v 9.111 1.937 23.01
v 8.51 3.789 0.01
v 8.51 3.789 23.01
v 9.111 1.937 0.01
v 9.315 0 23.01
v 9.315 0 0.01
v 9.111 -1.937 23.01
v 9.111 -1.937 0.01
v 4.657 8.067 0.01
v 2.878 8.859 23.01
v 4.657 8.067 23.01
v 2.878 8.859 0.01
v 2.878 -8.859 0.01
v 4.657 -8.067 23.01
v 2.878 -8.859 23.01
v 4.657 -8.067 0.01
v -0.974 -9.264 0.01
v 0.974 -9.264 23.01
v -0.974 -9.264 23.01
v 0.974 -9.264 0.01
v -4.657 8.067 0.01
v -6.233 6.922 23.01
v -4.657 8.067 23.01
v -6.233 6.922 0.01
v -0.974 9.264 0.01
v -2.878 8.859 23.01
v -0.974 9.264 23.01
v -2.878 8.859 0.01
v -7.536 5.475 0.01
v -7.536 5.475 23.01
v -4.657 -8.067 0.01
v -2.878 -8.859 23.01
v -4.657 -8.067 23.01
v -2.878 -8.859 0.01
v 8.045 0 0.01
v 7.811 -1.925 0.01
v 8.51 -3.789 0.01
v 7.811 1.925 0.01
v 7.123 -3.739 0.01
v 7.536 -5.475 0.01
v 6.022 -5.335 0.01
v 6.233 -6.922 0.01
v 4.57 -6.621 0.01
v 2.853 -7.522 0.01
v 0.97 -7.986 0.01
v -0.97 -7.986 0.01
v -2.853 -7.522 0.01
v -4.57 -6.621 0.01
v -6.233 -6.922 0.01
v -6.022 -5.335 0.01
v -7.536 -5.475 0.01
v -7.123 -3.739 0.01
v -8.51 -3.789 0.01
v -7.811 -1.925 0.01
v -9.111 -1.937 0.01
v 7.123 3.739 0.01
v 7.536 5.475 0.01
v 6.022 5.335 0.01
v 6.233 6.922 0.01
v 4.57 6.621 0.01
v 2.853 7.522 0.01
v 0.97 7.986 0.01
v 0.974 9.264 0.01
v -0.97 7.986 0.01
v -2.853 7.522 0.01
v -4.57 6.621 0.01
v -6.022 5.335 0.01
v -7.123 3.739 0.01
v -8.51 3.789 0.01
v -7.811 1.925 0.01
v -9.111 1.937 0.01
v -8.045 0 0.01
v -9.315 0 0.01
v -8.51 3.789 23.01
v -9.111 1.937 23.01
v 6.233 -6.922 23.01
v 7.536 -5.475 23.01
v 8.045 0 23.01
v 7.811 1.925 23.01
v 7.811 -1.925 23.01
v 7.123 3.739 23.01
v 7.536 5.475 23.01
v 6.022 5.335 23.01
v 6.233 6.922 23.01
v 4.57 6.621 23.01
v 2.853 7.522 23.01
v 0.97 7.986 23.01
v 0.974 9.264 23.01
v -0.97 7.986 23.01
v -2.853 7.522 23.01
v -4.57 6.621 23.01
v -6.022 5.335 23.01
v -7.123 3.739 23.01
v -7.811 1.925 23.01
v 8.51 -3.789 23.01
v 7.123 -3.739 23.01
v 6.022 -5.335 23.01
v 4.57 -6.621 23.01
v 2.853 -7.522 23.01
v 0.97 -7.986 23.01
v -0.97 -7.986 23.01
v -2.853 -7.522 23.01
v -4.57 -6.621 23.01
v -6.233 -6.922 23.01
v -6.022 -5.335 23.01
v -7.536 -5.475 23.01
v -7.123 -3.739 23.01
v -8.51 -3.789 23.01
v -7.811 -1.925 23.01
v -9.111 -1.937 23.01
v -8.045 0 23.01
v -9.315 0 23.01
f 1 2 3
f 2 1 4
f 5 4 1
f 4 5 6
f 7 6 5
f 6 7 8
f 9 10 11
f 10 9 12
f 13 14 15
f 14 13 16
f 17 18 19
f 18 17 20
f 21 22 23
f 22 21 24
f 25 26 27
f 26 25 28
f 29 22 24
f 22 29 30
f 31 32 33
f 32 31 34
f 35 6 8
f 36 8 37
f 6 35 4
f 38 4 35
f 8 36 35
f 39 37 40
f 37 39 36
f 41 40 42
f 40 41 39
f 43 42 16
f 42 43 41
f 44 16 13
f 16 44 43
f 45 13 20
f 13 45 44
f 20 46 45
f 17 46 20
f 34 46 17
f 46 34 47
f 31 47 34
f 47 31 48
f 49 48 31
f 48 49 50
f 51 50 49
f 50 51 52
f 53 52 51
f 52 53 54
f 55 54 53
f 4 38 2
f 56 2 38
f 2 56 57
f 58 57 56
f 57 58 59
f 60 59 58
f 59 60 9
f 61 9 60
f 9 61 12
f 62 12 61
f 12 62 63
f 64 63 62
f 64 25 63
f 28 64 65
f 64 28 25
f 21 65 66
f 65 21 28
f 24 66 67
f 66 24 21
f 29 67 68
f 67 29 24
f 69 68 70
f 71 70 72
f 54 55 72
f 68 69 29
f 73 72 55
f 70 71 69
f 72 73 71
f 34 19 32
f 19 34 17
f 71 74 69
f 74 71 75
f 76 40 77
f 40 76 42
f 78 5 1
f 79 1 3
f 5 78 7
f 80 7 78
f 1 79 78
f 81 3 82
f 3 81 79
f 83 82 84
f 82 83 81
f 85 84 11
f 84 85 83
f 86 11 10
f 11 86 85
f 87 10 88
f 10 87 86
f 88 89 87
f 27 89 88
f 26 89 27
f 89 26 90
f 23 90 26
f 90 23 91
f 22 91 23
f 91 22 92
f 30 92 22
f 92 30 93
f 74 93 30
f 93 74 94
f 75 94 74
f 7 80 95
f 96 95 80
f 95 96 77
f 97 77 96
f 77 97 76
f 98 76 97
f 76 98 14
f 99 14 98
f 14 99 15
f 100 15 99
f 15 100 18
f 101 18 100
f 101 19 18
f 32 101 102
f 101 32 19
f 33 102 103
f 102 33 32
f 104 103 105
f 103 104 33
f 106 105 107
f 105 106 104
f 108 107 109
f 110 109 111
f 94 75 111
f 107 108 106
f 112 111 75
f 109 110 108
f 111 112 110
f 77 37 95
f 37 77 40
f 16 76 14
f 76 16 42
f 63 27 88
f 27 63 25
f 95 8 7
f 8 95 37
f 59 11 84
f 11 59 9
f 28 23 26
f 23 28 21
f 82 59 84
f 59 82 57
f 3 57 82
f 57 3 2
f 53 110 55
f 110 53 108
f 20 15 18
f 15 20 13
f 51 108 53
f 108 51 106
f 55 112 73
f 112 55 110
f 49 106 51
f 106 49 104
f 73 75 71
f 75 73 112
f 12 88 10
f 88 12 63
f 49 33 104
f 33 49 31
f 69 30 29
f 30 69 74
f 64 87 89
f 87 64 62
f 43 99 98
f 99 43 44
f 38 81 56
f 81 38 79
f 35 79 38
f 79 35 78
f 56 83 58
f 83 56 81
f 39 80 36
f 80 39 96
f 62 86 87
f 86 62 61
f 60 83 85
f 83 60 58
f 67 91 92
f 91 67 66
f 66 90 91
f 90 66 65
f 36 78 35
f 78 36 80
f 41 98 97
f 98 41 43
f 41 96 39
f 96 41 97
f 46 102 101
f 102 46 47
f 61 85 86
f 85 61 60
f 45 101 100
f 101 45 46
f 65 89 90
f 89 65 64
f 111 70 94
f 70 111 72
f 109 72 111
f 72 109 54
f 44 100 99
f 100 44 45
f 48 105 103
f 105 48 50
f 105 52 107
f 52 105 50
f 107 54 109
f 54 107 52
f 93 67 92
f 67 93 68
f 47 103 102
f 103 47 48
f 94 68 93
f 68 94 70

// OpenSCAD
// -------------------------------------
// Title:        Boton Honda Civic
// Version:      1.0
// Release Date: 2023-05-22
// Author:       Eloy Asensio (eloi.asensio@gmail.com)
// -------------------------------------
//
// Description: Botón del regulador de volumen del Honda Civic
//
// Release Notes:
//
// - Version 1.0:  Versión inicial del Boton Honda Civic
//
 
// -------------------------------------
// Parameters
// -------------------------------------
EPS = 0.01+0;
showButton="Core"; // [External Button, Inner Button, Core]
button_hight = 23; //.1
button_diameter = 40; //.1

inner_button_diameter = 16.09; //.1
inner_button_height = 9; //.1
inner_button_wall=2.54; //.1
inner_button_bottom_height = 2; //.1
inner_button_bottom_diameter = 10; //.1
neck_rad_inner_button = 1; //.1
neck_height_inner_button = 2; //.1

dilatation_margin = 0.6; //.1
inner_dilatation_margin = 1.0; //.1

arc_heigh= 6; //.1
arc_deep= 1; //.1

// -------------------------------------
// Calculated Parameters
// -------------------------------------
l_inner_height = button_hight - neck_height_inner_button + (EPS*2);

// -------------------------------------
// Main
// -------------------------------------
main();

module main(){
    if(showButton=="External Button"){
        externalButton();
    }
    else if(showButton=="Inner Button"){
        innerButton();
    }
    else{
        core();
    }
}

// -------------------------------------
// Modules
// -------------------------------------
module core(){
    customHeight = button_hight+(EPS*2);
    translate([0,0,customHeight/2])
    difference(){
        cylinder(h=button_hight,d=inner_button_diameter+inner_button_wall, center=true);
        cylinder(h=customHeight,d=inner_button_diameter,center=true);
    }
}

module externalButton(){
    l_height = button_hight + (EPS*2);
    angle =  asin(inner_button_wall/inner_button_diameter) ;
    
    union(){
         difference(){
            translate([0,0,button_hight/2])
                cylinder(h=button_hight,d=button_diameter, center= true);
            union(){
                translate([0,0,l_height/2 - EPS ])
                    cylinder(
                        h=l_height,
                        d=inner_button_diameter -  neck_rad_inner_button, 
                        center= true
                    );
                translate([0,0,(l_inner_height/2 - EPS)])
                    cylinder(h=l_inner_height,
                        d=inner_button_diameter + inner_button_wall + dilatation_margin,
                        center= true
                    );   
            }
        }
        
        arc(
            a=angle, 
            r1=(inner_button_diameter/2+inner_button_wall -EPS),
                r2=inner_button_diameter/2 + arc_deep -EPS, 
            h=arc_heigh
        );
        rotate([0,0,360/3])
            arc(
                a=angle, 
                r1=(inner_button_diameter/2+inner_button_wall -EPS), 
                r2=inner_button_diameter/2 + arc_deep -EPS, 
                h=arc_heigh
            );
        rotate([0,0,(360/3)*2])
            arc(
                a=angle, 
                r1=(inner_button_diameter/2+inner_button_wall -EPS), 
                r2=inner_button_diameter/2 + arc_deep -EPS, 
                h=arc_heigh
            );
    }
}

module innerButton(){
    top_cilinder_height = button_hight + (button_hight-l_inner_height);
    union(){
        translate([0,0,inner_button_bottom_height])
            union(){
                translate([0,0,button_hight/2])
                    cylinder(h=button_hight ,d=inner_button_diameter  - inner_dilatation_margin, center= true);
                translate([0,0,top_cilinder_height/2])
                    cylinder(h=top_cilinder_height ,d=inner_button_diameter -  neck_rad_inner_button - dilatation_margin*2, center= true);
                        
            };
         translate([0,0,inner_button_bottom_height/2+EPS])
                    cylinder(h=inner_button_bottom_height+EPS ,d=inner_button_bottom_diameter, center= true);
    }
}


module arc(a, r1, r2, h){
    angles = [0, a];
    points1 = [
        for(a = [angles[0]:1:angles[1]]) [r1 * cos(a), r1 * sin(a)]
    ];
    points2 = [
        for(a = [angles[0]:1:angles[1]]) [r2 * cos(a), r2 * sin(a)]
    ]; 
    
    translate([0,0,h/2])    
    difference(){
        linear_extrude(height = h, center = true, convexity = 10, $fn = 100)
        polygon(concat([[0, 0]], points1));
        cylinder(h= h+(EPS*2),r=r2,center=true);
    }
}
